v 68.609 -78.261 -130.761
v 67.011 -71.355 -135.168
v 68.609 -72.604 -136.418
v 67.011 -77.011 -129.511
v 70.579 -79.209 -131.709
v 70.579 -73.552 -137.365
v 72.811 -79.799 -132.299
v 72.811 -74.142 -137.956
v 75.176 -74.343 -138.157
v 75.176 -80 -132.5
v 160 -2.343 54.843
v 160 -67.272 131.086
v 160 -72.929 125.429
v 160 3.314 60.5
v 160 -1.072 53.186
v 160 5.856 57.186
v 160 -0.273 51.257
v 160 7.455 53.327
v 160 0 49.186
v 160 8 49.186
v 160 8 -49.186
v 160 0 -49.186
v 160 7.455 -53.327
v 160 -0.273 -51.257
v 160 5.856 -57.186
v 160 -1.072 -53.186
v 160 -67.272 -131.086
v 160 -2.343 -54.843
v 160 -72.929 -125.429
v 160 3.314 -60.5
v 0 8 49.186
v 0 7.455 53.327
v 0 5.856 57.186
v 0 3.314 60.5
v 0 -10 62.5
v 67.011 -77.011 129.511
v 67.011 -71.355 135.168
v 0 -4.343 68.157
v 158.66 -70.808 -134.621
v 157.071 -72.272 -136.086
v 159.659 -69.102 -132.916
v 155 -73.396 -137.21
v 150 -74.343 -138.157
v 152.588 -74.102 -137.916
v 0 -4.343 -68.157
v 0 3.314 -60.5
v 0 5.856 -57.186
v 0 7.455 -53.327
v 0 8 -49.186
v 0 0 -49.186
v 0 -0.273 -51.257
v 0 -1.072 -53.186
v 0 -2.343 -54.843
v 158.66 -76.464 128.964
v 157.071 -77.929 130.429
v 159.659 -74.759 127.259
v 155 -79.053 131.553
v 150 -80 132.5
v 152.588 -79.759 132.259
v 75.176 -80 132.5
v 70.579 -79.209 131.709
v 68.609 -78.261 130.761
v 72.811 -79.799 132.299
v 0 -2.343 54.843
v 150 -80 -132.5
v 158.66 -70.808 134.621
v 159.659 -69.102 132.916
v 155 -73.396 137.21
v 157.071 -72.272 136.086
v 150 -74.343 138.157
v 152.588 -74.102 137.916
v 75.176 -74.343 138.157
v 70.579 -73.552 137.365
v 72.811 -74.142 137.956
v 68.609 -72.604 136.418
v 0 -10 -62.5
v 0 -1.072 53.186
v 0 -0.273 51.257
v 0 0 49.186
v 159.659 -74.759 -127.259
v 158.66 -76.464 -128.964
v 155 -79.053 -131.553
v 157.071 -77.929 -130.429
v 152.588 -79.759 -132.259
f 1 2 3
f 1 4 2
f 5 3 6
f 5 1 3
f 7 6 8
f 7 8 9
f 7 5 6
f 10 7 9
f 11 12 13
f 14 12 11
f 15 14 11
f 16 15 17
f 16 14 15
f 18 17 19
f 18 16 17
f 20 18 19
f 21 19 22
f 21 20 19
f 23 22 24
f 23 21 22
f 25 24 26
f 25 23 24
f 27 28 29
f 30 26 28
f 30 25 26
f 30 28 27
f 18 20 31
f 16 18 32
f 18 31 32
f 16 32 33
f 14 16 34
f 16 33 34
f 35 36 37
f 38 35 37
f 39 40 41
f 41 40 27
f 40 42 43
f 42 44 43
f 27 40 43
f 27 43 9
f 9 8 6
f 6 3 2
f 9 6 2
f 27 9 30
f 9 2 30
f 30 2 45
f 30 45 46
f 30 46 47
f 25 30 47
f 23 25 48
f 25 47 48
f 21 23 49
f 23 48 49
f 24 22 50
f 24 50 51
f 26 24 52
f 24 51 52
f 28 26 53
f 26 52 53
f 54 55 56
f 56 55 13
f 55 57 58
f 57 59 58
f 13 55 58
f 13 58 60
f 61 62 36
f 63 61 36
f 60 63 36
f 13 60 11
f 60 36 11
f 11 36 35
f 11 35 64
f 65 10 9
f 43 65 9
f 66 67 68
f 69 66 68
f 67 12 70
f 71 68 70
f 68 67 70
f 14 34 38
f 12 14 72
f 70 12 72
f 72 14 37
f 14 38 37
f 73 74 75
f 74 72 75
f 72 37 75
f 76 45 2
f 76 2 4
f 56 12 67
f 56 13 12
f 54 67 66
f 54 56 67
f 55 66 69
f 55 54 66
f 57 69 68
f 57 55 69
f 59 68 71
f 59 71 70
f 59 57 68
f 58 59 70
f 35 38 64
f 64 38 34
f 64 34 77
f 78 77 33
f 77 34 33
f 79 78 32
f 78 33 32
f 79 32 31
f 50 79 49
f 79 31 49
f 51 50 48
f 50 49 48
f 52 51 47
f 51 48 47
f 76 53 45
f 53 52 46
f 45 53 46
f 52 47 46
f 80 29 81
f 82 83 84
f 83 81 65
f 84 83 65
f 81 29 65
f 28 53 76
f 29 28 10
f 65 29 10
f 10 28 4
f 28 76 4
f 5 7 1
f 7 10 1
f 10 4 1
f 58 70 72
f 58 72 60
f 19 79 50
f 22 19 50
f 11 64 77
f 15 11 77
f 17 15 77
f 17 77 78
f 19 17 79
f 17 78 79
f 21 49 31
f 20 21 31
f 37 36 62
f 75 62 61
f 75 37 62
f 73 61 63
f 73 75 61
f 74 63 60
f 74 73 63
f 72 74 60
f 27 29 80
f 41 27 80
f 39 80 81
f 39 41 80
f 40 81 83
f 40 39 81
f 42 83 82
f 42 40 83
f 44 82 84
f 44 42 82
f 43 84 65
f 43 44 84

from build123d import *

# Parameters (mm, degrees)
SM_BASE_FLANGE_1_DEPTH = 160
CUT_EXTRUDE_START      = 3.884627654
CUT_EXTRUDE_1_DEPTH    = 98.974499311
FILLET_1_R             = 10


# Read off the part's stored shape, not the designer's step: 切除-拉伸1
# Sheet-metal steps are written as plain solids
with BuildPart() as part:
    # Sketch 1 → 基体-法兰1 (new body)
    with BuildSketch(Plane(origin=(0, 0, 0), x_dir=(0, 0, -1), z_dir=(1, 0, 0))):
        with BuildLine():
            Line((-132.5, -80), (-54.843145751, -2.343145751))
            ThreePointArc((-54.843145751, -2.343145751), (-52.24775896, -0.60896374), (-49.186291501, 0))
            Line((-49.186291501, 0), (49.186291501, 0))
            ThreePointArc((49.186291501, 0), (52.24775896, -0.60896374), (54.843145751, -2.343145751))
            Line((54.843145751, -2.343145751), (132.5, -80))
            Line((132.5, -80), (138.156854249, -74.343145751))
            Line((138.156854249, -74.343145751), (60.5, 3.313708499))
            ThreePointArc((60.5, 3.313708499), (55.309226419, 6.78207252), (49.186291501, 8))
            Line((49.186291501, 8), (-49.186291501, 8))
            ThreePointArc((-49.186291501, 8), (-55.309226419, 6.78207252), (-60.5, 3.313708499))
            Line((-60.5, 3.313708499), (-138.156854249, -74.343145751))
            Line((-138.156854249, -74.343145751), (-132.5, -80))
        make_face()
    extrude(amount=SM_BASE_FLANGE_1_DEPTH)

    # 切除-拉伸1 outline → 切除-拉伸1 (cut)
    with BuildSketch(Plane(origin=(0, 0, 0), x_dir=(0.8944271909999176, 0.4472135954999543, 0), z_dir=(0.4472135954999544, -0.8944271909999175, 0)).offset(CUT_EXTRUDE_START)):
        Polygon((-32.422985674, 0), (-4.472135955, 62.5), (29.362637858, 138.156854249), (30.186917696, 140), (-36, 140), (-36, 7.99844719), align=None)
        Polygon((-4.472135955, -62.5), (-32.422985674, 0), (-36, -7.99844719), (-36, -140), (30.186917696, -140), (29.362637858, -138.156854249), align=None)
    extrude(amount=CUT_EXTRUDE_1_DEPTH, mode=Mode.SUBTRACT)

    # 圆角1
    fillet_1_edges = [part.edges().sort_by_distance(p)[0] for p in [
        (160, -77.171572875, -135.328427125),
        (70, -77.171572875, 135.328427125),
        (70, -77.171572875, -135.328427125),
        (160, -77.171572875, 135.328427125),
    ]]
    fillet(fillet_1_edges, radius=FILLET_1_R)


solid = part.part
